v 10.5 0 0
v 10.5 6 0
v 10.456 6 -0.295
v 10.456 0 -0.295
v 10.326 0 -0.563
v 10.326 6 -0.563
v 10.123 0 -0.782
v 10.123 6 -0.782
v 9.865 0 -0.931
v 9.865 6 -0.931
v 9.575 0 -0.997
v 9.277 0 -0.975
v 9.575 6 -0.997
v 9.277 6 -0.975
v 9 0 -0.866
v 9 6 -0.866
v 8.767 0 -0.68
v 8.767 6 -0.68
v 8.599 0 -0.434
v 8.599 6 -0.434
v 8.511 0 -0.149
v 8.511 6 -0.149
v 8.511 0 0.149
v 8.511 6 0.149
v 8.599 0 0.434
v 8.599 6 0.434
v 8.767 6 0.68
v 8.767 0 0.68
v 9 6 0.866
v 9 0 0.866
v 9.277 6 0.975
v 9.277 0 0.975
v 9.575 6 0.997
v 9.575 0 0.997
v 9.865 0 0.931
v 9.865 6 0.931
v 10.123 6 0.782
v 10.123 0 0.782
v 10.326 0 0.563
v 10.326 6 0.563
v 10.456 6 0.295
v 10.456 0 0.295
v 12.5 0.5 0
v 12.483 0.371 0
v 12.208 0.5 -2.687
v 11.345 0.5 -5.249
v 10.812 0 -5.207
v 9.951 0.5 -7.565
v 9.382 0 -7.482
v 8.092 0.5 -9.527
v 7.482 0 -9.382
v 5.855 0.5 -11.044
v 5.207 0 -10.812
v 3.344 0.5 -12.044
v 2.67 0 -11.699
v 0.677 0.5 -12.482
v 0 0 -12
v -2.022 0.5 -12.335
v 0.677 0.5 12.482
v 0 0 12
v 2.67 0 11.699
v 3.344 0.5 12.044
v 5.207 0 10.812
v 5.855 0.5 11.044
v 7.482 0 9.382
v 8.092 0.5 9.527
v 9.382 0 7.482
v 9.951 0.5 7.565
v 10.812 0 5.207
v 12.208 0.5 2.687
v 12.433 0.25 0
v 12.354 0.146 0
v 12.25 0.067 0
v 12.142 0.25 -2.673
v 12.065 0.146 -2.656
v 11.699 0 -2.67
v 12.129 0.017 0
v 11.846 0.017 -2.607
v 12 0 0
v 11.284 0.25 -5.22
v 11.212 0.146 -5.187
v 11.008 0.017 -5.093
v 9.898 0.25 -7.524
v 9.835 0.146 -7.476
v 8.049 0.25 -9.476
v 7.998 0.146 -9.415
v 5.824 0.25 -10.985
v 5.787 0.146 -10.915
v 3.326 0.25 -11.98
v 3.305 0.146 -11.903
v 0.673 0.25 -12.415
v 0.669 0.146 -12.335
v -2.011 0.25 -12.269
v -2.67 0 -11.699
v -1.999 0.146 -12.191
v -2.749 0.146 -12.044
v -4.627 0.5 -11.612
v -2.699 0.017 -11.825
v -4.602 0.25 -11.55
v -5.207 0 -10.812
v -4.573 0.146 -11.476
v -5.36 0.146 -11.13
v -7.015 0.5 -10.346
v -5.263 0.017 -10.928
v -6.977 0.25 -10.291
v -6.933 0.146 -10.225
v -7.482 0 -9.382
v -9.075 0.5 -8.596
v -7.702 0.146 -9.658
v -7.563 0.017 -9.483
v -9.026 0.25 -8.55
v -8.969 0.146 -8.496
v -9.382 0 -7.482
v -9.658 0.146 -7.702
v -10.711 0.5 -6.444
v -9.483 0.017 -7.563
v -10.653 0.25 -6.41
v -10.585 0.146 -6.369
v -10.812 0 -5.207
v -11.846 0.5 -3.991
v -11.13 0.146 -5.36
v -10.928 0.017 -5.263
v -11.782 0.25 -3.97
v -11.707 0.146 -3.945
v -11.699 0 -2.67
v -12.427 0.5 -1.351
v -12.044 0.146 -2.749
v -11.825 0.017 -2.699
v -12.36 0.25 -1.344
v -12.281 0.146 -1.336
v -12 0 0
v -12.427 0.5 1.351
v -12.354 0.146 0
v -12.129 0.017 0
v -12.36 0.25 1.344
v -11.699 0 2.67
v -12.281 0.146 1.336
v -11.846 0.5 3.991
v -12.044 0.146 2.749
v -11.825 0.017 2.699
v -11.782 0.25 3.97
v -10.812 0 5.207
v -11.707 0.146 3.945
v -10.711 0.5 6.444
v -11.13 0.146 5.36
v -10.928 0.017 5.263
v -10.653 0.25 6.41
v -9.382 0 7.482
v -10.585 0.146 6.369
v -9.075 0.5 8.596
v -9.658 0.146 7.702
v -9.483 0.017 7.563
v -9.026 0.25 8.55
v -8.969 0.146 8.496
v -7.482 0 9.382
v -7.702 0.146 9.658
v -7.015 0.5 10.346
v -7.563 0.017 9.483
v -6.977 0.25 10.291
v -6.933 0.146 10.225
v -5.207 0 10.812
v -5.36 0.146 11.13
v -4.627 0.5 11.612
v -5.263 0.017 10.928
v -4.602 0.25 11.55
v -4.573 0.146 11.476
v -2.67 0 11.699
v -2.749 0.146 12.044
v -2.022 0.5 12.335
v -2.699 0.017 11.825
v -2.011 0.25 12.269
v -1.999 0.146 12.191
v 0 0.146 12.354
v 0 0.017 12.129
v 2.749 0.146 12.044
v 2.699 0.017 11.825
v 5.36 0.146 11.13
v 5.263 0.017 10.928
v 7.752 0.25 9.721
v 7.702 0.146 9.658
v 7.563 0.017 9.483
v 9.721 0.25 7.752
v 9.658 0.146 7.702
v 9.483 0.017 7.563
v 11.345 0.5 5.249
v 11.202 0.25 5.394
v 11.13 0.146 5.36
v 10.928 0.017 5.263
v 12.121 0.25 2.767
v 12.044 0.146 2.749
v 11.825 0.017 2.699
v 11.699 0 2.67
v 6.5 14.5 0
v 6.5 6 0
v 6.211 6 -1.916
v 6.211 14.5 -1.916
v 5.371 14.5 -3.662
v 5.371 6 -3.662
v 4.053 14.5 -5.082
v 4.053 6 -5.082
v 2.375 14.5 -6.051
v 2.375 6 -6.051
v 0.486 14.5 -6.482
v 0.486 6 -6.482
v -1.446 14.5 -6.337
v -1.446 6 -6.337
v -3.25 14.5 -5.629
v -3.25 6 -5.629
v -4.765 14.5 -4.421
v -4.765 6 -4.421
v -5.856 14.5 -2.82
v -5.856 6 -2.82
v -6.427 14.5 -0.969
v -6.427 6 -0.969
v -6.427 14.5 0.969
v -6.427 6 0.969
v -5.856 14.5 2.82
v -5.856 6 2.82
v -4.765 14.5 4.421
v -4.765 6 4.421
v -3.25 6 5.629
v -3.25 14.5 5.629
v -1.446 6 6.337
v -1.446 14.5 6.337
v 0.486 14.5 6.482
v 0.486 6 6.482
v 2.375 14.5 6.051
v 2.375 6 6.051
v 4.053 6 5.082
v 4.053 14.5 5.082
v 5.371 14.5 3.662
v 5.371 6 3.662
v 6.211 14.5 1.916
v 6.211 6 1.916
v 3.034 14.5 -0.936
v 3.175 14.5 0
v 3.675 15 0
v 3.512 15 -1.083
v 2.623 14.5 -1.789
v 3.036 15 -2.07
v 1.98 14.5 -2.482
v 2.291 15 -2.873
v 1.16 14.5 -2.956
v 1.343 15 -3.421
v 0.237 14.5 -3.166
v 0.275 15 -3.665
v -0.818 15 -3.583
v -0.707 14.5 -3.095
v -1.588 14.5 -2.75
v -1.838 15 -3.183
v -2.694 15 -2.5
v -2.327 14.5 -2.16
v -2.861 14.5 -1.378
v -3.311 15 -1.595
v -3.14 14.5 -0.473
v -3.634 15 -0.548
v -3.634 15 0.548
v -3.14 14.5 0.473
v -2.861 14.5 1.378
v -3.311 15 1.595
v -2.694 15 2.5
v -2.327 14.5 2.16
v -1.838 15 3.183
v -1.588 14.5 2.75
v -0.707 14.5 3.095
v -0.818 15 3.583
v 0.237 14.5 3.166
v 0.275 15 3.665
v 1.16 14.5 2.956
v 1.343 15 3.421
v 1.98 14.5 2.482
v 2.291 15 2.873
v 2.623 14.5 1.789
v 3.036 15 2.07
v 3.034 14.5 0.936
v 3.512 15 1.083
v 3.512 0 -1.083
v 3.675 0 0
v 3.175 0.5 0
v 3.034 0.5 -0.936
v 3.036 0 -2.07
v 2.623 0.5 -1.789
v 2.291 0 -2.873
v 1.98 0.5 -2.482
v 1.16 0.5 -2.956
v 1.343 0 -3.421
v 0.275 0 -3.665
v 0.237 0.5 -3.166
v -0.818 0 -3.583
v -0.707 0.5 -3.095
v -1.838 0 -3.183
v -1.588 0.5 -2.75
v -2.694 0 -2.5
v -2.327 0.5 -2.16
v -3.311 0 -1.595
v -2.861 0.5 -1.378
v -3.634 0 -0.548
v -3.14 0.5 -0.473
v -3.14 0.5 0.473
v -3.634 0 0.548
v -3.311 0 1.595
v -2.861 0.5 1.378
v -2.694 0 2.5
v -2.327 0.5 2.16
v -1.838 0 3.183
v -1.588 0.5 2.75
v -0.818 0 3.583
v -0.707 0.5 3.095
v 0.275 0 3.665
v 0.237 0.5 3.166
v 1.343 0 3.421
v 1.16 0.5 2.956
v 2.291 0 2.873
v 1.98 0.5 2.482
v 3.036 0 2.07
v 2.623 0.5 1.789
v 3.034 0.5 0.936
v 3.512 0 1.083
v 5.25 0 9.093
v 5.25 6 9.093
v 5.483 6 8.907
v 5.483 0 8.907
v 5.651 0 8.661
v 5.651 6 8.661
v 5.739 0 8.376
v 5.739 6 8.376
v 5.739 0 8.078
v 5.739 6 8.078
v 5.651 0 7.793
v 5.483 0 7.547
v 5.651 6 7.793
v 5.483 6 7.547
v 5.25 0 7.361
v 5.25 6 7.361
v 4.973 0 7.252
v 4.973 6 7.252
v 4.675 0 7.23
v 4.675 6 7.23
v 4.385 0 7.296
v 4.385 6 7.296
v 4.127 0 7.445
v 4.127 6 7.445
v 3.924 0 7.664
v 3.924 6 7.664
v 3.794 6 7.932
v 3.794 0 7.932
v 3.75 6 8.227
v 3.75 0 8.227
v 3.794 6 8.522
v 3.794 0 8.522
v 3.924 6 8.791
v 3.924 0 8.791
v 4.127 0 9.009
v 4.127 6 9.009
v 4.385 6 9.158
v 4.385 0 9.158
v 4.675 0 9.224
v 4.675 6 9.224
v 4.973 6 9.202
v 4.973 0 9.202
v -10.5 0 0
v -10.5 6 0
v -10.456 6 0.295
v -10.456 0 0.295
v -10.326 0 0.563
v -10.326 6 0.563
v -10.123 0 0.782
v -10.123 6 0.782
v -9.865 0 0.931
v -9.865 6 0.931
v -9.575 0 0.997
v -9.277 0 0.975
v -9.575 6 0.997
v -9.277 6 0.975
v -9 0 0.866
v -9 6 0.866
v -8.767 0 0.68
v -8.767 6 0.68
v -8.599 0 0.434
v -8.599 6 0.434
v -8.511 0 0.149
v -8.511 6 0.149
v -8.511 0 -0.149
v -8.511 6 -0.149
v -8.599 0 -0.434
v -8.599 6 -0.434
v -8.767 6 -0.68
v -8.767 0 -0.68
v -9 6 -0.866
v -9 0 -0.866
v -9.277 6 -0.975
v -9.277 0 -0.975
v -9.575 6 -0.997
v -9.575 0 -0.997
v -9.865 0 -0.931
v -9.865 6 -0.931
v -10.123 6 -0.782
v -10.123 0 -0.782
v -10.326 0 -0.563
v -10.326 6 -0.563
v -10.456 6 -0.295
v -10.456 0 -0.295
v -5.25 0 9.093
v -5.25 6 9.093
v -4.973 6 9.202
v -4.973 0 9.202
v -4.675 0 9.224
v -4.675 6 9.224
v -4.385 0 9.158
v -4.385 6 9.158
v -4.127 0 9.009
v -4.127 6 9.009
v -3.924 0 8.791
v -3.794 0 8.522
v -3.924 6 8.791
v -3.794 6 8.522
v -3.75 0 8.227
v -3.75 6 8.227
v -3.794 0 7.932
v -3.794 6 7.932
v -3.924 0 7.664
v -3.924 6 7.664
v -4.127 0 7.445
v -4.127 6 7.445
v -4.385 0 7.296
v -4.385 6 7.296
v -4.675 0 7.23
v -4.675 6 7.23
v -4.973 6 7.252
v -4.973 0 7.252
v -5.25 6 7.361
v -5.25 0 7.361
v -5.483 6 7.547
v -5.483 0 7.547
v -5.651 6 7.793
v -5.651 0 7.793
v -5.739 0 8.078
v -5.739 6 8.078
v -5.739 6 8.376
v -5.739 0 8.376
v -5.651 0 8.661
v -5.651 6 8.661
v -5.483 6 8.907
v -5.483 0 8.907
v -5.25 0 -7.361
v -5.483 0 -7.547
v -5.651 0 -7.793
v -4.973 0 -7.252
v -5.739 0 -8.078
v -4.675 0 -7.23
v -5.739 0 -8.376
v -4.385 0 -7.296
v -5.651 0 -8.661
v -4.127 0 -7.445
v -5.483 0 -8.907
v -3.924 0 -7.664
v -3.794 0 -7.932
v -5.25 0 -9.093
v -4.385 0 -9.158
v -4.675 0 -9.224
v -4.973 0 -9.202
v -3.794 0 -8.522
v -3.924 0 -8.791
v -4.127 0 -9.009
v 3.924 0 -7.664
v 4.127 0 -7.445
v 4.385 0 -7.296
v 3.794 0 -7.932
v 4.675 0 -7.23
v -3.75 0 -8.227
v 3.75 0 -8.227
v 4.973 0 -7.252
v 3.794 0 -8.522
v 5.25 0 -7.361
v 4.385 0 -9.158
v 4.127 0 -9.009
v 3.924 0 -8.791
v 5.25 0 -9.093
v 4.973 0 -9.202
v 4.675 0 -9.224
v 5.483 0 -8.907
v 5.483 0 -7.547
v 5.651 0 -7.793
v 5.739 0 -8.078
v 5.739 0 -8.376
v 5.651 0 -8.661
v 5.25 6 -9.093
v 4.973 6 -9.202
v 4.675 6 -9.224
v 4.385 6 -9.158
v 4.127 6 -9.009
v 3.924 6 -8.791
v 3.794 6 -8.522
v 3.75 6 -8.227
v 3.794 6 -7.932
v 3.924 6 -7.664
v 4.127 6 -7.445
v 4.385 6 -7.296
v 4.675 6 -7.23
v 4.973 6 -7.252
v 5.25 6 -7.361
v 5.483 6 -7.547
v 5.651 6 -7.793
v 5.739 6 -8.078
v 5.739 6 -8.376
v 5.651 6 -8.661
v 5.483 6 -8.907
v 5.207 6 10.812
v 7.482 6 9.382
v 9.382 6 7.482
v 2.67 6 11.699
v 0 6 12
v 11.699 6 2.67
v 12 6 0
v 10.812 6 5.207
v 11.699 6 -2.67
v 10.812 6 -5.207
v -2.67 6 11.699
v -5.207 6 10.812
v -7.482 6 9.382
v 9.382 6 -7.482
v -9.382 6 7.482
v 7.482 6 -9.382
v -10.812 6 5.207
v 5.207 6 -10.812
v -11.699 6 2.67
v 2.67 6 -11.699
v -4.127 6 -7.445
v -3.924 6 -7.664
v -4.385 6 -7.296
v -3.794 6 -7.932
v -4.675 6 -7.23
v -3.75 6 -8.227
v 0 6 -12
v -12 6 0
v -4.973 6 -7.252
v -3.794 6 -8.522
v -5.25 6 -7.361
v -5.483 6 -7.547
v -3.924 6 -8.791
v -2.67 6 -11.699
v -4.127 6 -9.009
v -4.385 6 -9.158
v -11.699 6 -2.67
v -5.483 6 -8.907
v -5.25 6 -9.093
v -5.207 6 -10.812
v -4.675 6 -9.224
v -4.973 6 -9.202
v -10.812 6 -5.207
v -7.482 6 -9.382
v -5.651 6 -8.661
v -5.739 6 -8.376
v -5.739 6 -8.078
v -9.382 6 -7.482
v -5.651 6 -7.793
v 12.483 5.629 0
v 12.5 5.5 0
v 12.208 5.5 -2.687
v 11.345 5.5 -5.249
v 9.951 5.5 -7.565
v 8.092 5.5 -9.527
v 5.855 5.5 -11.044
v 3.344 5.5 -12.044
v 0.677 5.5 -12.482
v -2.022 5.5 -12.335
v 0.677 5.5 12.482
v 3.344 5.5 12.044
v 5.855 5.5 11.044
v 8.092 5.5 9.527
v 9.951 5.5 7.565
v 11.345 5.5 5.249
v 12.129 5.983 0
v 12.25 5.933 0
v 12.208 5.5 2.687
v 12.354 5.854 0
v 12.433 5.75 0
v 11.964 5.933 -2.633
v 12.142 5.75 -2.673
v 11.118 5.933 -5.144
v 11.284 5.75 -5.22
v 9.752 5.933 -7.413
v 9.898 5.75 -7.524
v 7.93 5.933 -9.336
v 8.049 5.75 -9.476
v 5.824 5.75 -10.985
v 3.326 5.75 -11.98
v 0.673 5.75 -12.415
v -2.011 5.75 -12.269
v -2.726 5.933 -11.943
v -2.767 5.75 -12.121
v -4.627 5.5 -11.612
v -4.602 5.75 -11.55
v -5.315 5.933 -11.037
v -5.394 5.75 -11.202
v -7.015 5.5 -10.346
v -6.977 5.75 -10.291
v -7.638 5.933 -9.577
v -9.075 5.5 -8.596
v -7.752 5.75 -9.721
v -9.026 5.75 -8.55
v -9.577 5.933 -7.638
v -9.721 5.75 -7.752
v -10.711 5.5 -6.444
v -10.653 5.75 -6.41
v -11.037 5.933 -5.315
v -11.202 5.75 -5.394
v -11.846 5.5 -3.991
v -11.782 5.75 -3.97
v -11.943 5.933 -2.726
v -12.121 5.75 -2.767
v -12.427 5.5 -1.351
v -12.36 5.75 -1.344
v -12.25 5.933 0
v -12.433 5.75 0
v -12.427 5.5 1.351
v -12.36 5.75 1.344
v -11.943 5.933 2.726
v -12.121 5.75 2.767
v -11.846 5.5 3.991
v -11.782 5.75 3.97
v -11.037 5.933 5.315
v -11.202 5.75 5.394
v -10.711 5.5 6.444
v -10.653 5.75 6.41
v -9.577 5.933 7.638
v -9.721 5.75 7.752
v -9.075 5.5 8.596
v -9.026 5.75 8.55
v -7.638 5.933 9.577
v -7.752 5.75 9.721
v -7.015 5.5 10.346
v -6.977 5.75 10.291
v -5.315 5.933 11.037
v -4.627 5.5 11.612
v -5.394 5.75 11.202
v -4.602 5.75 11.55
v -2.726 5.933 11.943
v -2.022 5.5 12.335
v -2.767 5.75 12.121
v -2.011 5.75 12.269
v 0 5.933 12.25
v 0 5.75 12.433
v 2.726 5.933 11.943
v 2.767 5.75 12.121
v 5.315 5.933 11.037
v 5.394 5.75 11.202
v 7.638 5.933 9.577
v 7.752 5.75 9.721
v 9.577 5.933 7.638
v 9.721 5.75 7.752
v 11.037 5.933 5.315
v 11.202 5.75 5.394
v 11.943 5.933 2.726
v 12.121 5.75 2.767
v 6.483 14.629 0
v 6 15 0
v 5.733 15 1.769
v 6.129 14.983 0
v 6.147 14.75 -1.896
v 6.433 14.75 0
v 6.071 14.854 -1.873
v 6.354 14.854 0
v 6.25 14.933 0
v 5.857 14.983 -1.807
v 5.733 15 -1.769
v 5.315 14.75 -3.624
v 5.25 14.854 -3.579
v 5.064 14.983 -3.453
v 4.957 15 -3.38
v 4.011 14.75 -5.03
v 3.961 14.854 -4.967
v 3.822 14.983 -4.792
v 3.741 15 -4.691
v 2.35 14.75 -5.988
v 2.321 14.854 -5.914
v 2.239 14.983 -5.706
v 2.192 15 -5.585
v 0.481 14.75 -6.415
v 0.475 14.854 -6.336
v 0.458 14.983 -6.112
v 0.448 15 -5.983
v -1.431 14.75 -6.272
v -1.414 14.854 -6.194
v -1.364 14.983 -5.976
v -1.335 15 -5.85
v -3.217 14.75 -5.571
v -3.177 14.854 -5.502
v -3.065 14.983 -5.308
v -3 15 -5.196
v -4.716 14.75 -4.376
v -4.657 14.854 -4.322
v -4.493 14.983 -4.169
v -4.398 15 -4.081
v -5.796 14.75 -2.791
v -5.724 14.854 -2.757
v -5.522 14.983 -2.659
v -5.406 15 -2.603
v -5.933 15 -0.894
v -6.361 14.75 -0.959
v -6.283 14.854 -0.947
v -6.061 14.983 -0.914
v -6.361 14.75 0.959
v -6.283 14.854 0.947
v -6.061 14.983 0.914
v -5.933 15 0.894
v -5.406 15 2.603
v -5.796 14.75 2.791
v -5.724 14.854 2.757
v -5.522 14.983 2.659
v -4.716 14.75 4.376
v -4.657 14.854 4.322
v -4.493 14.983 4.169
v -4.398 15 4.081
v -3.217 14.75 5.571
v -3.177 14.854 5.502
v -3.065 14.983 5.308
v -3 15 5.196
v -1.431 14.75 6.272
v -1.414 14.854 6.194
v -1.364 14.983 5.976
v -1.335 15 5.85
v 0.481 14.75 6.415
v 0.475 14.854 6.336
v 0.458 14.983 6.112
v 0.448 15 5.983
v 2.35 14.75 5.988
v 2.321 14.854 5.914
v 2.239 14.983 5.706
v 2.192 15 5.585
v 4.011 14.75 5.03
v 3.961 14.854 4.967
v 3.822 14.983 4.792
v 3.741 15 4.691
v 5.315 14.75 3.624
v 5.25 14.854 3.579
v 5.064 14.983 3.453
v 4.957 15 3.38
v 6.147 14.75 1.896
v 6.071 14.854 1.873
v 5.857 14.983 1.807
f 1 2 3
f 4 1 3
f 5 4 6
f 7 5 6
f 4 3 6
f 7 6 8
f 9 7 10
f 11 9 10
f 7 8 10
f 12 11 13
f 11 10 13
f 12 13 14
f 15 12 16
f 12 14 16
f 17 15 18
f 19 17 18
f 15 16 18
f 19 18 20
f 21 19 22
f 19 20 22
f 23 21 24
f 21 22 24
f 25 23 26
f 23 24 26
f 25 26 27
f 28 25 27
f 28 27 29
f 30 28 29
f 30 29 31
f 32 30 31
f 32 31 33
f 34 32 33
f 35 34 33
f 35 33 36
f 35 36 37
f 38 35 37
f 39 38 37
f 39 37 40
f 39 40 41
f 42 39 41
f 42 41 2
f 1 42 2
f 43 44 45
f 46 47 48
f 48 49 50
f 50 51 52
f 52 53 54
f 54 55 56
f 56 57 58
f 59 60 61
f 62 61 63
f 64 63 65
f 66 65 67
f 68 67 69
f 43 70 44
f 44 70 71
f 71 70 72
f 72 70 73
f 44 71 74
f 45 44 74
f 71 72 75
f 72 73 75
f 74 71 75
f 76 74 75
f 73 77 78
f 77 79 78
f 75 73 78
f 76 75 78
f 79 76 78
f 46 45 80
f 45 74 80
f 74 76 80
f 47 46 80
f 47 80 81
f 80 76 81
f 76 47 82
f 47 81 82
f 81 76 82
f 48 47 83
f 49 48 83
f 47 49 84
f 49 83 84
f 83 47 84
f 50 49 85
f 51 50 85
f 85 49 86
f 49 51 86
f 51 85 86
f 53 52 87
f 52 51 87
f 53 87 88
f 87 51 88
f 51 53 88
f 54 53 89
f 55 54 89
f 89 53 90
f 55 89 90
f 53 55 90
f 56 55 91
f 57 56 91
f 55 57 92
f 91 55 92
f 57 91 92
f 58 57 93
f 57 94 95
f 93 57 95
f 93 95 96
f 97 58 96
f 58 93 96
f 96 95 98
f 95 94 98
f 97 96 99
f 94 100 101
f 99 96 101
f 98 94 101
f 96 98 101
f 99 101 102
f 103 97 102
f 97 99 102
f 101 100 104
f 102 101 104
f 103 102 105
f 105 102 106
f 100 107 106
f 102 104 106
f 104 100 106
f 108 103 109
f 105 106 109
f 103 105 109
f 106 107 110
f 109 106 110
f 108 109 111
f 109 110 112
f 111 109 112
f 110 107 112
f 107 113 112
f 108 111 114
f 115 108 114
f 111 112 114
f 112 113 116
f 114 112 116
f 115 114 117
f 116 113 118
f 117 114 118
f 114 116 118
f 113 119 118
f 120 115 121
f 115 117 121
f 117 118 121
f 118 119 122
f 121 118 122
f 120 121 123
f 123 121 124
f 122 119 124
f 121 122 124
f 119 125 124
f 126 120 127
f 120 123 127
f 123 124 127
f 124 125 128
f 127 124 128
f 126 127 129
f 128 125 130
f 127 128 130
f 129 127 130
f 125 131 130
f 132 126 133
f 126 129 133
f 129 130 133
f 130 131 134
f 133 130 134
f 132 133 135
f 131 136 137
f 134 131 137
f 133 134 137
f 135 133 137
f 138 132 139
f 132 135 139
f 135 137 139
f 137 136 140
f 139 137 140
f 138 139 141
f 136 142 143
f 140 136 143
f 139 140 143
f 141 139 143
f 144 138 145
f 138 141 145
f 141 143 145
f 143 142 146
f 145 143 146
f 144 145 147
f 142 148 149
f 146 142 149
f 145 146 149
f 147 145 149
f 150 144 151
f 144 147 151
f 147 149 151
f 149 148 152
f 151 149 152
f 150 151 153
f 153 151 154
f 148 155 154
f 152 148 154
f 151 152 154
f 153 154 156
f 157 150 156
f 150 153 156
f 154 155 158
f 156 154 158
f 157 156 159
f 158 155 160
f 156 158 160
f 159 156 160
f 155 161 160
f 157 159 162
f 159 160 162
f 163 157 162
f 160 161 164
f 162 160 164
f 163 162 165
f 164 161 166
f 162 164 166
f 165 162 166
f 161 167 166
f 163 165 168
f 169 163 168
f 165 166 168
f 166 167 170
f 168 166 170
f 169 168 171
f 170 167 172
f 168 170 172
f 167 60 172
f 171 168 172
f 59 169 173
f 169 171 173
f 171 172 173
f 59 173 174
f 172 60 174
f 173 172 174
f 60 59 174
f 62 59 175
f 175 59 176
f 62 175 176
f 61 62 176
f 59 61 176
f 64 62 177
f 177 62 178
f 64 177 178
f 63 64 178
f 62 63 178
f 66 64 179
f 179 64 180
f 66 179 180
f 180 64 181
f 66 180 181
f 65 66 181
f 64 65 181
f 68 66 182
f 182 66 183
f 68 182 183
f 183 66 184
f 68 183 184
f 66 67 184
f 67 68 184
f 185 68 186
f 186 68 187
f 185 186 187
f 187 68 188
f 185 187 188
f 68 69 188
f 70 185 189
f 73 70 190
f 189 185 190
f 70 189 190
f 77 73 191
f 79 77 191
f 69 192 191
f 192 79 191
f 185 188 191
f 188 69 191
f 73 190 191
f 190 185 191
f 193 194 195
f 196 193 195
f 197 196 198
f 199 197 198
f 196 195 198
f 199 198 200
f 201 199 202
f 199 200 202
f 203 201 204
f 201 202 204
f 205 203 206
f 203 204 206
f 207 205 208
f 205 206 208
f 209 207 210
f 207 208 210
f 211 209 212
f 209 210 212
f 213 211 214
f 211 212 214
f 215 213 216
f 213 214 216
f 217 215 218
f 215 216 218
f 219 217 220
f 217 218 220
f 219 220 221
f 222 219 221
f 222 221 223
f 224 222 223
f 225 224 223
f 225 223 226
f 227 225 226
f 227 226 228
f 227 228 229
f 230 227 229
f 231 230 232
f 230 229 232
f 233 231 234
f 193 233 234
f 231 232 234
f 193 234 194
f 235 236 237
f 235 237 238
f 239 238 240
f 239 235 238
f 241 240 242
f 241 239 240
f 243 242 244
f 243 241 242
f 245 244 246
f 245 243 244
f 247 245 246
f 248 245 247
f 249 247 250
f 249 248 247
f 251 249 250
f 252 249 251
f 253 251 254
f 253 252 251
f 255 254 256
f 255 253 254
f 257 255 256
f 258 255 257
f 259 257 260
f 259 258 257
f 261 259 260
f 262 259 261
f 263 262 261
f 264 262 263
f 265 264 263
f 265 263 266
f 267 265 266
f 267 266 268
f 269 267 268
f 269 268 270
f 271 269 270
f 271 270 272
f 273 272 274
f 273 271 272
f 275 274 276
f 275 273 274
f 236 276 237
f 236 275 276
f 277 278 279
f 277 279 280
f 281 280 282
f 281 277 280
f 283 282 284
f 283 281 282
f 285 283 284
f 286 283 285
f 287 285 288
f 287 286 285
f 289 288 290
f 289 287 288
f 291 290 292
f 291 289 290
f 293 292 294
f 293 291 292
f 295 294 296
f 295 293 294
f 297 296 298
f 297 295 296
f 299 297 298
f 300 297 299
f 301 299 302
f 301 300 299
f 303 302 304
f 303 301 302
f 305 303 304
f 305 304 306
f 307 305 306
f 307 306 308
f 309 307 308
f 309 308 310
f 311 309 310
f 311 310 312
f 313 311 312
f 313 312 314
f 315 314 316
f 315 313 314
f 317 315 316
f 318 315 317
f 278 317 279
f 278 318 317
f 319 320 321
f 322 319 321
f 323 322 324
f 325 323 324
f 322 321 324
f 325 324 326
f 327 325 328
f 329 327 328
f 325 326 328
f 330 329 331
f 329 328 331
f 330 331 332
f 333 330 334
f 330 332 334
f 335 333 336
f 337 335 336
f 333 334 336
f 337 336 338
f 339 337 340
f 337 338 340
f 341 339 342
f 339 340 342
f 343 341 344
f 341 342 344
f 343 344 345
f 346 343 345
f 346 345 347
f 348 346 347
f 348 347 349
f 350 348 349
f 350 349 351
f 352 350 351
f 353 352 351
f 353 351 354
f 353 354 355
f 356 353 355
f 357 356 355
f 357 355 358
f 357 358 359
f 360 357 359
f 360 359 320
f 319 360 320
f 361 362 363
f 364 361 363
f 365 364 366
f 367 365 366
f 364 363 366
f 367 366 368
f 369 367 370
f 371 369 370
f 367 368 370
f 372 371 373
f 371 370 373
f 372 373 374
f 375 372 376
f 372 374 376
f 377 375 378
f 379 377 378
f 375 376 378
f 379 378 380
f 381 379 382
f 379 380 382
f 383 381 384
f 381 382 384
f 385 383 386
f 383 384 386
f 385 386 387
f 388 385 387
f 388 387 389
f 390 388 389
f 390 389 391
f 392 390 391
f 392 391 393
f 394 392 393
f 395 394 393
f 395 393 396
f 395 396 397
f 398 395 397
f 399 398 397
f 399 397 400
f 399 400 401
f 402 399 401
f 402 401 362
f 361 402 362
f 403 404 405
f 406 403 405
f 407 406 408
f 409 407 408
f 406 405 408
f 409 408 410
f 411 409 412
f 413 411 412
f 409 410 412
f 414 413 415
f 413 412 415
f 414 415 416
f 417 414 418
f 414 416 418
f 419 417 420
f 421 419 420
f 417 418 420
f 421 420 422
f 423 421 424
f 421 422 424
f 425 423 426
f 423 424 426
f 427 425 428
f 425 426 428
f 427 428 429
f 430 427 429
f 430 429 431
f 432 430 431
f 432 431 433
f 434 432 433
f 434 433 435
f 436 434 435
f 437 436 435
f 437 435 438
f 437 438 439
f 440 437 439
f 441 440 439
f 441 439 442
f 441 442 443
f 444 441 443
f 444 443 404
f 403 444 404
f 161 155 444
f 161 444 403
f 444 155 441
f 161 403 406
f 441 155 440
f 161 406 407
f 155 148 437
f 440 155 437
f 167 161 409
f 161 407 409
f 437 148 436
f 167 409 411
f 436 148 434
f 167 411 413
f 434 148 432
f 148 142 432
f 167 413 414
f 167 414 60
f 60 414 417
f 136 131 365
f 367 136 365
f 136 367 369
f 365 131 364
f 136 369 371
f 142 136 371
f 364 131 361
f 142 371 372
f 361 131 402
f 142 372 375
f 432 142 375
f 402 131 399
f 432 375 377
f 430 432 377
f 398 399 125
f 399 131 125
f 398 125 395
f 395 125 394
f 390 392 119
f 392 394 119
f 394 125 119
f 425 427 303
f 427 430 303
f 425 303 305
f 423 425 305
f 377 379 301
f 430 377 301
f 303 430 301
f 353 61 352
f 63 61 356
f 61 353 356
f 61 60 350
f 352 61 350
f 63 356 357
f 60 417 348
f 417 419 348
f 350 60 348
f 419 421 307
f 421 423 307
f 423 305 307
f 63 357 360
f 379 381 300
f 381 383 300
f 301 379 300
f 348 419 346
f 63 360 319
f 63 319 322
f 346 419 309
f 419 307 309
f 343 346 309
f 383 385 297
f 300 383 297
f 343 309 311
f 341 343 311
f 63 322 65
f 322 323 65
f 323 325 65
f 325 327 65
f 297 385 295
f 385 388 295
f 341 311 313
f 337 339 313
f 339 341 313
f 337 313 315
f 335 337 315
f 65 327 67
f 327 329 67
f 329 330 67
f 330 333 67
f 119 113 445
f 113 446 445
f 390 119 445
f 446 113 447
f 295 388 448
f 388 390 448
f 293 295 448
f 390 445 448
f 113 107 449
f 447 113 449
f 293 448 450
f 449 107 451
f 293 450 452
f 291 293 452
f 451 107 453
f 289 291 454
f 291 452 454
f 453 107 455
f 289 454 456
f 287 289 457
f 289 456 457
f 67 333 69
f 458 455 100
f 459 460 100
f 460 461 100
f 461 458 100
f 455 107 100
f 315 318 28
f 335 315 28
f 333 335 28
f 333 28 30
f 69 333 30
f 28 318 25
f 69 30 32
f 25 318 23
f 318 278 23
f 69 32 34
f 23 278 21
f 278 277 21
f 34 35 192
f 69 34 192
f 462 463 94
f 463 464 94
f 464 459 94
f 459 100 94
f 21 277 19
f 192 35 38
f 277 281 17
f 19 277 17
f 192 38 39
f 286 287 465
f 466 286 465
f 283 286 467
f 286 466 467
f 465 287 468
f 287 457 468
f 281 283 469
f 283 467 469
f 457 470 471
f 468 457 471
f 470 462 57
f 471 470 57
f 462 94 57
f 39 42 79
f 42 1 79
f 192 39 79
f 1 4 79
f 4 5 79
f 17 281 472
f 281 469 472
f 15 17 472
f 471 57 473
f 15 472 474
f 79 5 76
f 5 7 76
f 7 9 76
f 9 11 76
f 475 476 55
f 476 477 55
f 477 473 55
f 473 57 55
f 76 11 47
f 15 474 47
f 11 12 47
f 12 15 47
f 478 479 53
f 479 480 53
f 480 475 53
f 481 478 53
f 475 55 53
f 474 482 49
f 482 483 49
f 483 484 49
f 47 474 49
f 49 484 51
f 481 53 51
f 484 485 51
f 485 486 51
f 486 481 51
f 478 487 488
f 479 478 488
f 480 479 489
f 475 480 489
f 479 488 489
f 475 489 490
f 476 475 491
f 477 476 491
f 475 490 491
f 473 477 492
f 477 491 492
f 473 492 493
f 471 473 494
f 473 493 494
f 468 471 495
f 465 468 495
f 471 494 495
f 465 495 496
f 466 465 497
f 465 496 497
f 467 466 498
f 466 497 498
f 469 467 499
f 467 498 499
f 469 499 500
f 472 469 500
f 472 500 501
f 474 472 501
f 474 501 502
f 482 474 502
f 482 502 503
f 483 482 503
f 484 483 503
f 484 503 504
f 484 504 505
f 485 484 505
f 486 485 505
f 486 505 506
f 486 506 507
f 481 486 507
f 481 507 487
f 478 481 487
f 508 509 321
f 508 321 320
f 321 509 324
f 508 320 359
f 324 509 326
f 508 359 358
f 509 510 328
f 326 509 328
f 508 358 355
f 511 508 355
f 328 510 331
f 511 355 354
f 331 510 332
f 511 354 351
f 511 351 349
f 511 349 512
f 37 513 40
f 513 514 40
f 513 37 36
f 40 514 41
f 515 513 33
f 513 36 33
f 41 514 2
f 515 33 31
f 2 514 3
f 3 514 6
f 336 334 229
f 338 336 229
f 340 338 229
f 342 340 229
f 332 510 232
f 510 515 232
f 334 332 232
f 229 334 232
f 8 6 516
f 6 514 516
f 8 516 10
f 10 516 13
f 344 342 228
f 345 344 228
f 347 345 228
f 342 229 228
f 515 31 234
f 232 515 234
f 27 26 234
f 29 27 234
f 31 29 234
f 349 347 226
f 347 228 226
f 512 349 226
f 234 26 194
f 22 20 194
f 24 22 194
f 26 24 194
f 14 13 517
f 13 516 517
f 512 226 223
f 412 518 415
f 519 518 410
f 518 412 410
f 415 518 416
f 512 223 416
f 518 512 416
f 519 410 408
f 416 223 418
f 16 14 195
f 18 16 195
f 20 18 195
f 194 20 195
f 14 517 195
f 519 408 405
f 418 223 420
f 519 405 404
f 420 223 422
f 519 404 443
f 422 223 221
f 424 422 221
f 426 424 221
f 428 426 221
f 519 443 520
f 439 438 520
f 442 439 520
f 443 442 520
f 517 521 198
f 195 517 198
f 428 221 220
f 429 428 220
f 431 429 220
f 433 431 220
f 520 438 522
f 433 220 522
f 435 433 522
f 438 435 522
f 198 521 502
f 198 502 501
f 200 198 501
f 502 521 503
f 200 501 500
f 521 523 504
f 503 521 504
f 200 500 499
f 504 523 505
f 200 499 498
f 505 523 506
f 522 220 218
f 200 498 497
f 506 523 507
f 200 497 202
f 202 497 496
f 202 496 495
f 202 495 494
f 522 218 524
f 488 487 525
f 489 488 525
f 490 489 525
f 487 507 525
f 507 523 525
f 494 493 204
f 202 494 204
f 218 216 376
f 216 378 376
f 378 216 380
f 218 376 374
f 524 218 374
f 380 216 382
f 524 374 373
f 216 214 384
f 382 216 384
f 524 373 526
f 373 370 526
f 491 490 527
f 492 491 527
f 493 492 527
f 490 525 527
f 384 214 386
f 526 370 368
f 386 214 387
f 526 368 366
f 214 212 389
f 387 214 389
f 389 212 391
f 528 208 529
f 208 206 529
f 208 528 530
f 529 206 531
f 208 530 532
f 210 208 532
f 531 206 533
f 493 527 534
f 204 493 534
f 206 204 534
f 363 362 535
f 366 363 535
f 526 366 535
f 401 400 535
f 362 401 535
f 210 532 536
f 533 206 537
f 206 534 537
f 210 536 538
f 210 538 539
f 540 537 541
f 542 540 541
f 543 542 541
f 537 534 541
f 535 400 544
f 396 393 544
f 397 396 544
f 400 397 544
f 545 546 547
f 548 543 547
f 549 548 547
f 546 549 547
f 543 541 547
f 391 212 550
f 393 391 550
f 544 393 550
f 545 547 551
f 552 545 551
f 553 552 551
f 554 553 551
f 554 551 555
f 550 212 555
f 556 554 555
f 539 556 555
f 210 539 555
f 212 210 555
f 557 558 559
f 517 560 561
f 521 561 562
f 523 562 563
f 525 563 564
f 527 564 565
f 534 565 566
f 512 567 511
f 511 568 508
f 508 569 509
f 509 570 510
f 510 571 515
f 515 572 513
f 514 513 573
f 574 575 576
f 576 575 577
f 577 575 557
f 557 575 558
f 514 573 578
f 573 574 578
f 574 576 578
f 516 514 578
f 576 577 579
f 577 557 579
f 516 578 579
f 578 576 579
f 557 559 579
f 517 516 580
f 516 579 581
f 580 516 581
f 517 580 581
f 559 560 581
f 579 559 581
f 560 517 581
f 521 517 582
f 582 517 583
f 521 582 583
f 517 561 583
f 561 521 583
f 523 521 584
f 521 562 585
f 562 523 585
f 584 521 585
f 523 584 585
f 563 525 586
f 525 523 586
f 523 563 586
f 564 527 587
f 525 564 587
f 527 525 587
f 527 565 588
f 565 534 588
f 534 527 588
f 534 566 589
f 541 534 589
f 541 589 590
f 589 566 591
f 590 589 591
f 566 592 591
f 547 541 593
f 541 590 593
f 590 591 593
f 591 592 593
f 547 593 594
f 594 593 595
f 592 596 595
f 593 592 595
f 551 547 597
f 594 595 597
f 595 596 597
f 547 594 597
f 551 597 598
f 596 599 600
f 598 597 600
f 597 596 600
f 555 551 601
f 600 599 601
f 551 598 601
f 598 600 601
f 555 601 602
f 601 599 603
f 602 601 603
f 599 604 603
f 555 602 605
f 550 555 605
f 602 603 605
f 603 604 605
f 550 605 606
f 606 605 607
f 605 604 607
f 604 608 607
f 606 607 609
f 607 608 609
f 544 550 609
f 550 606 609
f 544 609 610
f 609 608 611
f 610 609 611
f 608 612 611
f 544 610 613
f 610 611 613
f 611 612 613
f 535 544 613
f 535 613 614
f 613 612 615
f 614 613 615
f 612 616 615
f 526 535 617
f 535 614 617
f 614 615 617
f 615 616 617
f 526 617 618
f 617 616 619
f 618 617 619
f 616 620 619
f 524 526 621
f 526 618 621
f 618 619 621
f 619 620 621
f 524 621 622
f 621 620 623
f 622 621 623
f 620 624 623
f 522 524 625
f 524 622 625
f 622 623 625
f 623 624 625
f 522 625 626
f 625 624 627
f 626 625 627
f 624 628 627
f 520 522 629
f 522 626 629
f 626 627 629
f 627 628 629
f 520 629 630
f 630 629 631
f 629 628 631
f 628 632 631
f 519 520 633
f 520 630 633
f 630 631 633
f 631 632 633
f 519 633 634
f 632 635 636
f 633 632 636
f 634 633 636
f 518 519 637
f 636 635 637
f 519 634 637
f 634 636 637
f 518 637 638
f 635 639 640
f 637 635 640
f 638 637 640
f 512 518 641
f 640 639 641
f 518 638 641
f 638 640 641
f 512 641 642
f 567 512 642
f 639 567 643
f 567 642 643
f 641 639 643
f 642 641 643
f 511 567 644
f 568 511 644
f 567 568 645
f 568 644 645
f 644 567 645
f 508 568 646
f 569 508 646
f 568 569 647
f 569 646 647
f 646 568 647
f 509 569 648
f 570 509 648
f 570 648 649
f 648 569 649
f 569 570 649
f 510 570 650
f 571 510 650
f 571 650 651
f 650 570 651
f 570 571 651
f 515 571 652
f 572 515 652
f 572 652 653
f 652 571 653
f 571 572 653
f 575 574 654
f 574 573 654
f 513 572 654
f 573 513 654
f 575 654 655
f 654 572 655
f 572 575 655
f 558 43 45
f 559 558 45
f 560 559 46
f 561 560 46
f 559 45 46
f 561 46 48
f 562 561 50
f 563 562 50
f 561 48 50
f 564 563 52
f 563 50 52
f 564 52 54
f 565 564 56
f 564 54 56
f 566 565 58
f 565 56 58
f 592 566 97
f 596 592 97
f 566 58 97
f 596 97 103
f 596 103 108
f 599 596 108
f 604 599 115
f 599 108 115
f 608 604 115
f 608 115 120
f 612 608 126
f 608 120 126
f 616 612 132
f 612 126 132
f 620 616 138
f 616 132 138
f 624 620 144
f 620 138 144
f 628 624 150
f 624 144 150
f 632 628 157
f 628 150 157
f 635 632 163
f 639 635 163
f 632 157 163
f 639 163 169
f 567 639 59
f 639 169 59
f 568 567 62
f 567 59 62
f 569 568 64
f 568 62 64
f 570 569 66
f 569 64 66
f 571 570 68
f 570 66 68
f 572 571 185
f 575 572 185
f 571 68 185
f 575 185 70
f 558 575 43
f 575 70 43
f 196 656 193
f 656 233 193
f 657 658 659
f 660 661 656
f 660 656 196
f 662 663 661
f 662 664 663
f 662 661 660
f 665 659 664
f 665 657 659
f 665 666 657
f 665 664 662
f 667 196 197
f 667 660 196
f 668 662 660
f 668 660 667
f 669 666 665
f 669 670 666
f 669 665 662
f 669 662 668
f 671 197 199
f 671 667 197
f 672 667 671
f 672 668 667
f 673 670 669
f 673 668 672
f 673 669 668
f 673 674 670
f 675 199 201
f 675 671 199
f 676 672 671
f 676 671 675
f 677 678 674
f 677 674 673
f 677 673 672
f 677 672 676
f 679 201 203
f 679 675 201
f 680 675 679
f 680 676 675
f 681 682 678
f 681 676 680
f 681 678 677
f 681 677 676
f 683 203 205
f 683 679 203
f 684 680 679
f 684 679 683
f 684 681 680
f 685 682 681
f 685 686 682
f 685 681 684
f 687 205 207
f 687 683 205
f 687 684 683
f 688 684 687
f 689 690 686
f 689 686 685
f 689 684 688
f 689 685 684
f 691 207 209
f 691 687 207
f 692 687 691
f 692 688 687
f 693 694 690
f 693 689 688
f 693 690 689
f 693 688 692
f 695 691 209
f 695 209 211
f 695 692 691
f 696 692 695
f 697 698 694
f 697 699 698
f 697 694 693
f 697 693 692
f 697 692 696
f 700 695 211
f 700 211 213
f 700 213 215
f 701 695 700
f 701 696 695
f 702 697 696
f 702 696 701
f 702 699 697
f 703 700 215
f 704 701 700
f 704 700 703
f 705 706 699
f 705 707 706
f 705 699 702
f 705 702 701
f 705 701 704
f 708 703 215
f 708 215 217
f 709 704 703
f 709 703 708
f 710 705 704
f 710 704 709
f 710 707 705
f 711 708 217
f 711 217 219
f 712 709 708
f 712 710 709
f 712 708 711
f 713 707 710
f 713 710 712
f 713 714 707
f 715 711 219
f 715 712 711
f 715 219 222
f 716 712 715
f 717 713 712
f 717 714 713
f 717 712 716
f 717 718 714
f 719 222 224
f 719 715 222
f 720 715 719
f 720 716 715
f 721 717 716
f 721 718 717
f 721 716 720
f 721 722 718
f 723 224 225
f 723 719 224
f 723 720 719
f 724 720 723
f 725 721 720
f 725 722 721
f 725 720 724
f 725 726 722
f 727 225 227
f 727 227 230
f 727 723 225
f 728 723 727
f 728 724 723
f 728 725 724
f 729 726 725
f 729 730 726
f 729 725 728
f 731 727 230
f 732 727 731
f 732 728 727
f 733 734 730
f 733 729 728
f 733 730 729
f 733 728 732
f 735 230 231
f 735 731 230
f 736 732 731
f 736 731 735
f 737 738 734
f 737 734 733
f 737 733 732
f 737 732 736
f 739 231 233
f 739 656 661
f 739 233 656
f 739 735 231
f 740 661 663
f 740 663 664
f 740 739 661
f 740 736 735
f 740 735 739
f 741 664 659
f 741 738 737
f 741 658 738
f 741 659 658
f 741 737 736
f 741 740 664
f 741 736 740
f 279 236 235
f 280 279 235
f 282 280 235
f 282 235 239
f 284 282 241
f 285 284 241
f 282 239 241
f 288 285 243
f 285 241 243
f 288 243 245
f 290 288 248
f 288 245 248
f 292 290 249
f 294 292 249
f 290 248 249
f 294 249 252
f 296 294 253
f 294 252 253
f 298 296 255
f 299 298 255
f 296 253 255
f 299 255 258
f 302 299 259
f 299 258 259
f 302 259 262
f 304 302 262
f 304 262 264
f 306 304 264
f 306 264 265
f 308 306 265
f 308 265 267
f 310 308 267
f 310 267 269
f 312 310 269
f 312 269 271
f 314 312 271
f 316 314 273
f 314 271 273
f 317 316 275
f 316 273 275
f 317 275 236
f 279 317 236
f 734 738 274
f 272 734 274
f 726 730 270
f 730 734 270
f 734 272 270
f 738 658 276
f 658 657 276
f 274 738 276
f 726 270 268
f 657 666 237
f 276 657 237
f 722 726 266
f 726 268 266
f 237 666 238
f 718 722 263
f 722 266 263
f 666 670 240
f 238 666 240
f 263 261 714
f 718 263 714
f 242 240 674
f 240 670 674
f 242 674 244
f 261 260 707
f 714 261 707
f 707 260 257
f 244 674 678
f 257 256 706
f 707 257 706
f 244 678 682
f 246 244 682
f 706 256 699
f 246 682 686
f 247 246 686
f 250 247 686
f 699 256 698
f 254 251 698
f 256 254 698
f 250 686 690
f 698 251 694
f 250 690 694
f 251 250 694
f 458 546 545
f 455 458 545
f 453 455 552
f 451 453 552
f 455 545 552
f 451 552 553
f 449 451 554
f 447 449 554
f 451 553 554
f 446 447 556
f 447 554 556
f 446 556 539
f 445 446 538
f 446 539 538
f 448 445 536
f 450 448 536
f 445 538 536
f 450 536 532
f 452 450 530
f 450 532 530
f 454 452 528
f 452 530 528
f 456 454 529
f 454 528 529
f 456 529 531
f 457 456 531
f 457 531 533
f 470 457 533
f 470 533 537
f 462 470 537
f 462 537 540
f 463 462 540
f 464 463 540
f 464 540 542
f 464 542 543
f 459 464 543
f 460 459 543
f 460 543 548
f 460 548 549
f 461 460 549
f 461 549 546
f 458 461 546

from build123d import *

# Parameters (mm, degrees)
ESQUISSE3_R                  = 1
ENL_V_MAT_EXTRU_1_DEPTH      = 7
R_P_TITION_CIRCULAIRE1_COUNT = 6
CONG_1_R                     = 0.5
CHANFREIN1_SIZE              = 0.5


with BuildPart() as part:
    # Esquisse1 → Révolution2 (revolve)
    with BuildSketch(Plane.XY):
        Polygon((6.5, 15), (6.5, 6), (12.5, 6), (12.5, 0), (3.175, 0), (3.175, 15), align=None)
    revolve(axis=Axis((0, 0, 0), (0, 1, 0)))

    # Esquisse3 → Enlèv. mat.-Extru.1 (cut, through all)
    with BuildSketch(Plane(origin=(0, 6, 0), x_dir=(1, 0, 0), z_dir=(0, 1, 0))):
        with Locations((9.5, 0)):
            Circle(ESQUISSE3_R)
    enl_v_mat_extru_1 = extrude(amount=-ENL_V_MAT_EXTRU_1_DEPTH, mode=Mode.SUBTRACT)

    # Répétition circulaire1: Enlèv. mat.-Extru.1 ×6 about axis
    r_p_tition_circulaire1_axis = Axis((0, 0, 0), (0, 1, 0))
    for i in range(1, R_P_TITION_CIRCULAIRE1_COUNT):
        add(enl_v_mat_extru_1.rotate(r_p_tition_circulaire1_axis, i * 360 / R_P_TITION_CIRCULAIRE1_COUNT), mode=Mode.SUBTRACT)

    # Congé1
    cong_1_edges = [part.edges().sort_by_distance(p)[0] for p in [
        (-6.5, 15, 0),
        (-12.5, 6, 0),
        (-12.5, 0, 0),
    ]]
    fillet(cong_1_edges, radius=CONG_1_R)

    # Chanfrein1
    chanfrein1_edges = [part.edges().sort_by_distance(p)[0] for p in [
        (-3.175, 0, 0),
        (-3.175, 15, 0),
    ]]
    chamfer(chanfrein1_edges, length=CHANFREIN1_SIZE)


solid = part.part
